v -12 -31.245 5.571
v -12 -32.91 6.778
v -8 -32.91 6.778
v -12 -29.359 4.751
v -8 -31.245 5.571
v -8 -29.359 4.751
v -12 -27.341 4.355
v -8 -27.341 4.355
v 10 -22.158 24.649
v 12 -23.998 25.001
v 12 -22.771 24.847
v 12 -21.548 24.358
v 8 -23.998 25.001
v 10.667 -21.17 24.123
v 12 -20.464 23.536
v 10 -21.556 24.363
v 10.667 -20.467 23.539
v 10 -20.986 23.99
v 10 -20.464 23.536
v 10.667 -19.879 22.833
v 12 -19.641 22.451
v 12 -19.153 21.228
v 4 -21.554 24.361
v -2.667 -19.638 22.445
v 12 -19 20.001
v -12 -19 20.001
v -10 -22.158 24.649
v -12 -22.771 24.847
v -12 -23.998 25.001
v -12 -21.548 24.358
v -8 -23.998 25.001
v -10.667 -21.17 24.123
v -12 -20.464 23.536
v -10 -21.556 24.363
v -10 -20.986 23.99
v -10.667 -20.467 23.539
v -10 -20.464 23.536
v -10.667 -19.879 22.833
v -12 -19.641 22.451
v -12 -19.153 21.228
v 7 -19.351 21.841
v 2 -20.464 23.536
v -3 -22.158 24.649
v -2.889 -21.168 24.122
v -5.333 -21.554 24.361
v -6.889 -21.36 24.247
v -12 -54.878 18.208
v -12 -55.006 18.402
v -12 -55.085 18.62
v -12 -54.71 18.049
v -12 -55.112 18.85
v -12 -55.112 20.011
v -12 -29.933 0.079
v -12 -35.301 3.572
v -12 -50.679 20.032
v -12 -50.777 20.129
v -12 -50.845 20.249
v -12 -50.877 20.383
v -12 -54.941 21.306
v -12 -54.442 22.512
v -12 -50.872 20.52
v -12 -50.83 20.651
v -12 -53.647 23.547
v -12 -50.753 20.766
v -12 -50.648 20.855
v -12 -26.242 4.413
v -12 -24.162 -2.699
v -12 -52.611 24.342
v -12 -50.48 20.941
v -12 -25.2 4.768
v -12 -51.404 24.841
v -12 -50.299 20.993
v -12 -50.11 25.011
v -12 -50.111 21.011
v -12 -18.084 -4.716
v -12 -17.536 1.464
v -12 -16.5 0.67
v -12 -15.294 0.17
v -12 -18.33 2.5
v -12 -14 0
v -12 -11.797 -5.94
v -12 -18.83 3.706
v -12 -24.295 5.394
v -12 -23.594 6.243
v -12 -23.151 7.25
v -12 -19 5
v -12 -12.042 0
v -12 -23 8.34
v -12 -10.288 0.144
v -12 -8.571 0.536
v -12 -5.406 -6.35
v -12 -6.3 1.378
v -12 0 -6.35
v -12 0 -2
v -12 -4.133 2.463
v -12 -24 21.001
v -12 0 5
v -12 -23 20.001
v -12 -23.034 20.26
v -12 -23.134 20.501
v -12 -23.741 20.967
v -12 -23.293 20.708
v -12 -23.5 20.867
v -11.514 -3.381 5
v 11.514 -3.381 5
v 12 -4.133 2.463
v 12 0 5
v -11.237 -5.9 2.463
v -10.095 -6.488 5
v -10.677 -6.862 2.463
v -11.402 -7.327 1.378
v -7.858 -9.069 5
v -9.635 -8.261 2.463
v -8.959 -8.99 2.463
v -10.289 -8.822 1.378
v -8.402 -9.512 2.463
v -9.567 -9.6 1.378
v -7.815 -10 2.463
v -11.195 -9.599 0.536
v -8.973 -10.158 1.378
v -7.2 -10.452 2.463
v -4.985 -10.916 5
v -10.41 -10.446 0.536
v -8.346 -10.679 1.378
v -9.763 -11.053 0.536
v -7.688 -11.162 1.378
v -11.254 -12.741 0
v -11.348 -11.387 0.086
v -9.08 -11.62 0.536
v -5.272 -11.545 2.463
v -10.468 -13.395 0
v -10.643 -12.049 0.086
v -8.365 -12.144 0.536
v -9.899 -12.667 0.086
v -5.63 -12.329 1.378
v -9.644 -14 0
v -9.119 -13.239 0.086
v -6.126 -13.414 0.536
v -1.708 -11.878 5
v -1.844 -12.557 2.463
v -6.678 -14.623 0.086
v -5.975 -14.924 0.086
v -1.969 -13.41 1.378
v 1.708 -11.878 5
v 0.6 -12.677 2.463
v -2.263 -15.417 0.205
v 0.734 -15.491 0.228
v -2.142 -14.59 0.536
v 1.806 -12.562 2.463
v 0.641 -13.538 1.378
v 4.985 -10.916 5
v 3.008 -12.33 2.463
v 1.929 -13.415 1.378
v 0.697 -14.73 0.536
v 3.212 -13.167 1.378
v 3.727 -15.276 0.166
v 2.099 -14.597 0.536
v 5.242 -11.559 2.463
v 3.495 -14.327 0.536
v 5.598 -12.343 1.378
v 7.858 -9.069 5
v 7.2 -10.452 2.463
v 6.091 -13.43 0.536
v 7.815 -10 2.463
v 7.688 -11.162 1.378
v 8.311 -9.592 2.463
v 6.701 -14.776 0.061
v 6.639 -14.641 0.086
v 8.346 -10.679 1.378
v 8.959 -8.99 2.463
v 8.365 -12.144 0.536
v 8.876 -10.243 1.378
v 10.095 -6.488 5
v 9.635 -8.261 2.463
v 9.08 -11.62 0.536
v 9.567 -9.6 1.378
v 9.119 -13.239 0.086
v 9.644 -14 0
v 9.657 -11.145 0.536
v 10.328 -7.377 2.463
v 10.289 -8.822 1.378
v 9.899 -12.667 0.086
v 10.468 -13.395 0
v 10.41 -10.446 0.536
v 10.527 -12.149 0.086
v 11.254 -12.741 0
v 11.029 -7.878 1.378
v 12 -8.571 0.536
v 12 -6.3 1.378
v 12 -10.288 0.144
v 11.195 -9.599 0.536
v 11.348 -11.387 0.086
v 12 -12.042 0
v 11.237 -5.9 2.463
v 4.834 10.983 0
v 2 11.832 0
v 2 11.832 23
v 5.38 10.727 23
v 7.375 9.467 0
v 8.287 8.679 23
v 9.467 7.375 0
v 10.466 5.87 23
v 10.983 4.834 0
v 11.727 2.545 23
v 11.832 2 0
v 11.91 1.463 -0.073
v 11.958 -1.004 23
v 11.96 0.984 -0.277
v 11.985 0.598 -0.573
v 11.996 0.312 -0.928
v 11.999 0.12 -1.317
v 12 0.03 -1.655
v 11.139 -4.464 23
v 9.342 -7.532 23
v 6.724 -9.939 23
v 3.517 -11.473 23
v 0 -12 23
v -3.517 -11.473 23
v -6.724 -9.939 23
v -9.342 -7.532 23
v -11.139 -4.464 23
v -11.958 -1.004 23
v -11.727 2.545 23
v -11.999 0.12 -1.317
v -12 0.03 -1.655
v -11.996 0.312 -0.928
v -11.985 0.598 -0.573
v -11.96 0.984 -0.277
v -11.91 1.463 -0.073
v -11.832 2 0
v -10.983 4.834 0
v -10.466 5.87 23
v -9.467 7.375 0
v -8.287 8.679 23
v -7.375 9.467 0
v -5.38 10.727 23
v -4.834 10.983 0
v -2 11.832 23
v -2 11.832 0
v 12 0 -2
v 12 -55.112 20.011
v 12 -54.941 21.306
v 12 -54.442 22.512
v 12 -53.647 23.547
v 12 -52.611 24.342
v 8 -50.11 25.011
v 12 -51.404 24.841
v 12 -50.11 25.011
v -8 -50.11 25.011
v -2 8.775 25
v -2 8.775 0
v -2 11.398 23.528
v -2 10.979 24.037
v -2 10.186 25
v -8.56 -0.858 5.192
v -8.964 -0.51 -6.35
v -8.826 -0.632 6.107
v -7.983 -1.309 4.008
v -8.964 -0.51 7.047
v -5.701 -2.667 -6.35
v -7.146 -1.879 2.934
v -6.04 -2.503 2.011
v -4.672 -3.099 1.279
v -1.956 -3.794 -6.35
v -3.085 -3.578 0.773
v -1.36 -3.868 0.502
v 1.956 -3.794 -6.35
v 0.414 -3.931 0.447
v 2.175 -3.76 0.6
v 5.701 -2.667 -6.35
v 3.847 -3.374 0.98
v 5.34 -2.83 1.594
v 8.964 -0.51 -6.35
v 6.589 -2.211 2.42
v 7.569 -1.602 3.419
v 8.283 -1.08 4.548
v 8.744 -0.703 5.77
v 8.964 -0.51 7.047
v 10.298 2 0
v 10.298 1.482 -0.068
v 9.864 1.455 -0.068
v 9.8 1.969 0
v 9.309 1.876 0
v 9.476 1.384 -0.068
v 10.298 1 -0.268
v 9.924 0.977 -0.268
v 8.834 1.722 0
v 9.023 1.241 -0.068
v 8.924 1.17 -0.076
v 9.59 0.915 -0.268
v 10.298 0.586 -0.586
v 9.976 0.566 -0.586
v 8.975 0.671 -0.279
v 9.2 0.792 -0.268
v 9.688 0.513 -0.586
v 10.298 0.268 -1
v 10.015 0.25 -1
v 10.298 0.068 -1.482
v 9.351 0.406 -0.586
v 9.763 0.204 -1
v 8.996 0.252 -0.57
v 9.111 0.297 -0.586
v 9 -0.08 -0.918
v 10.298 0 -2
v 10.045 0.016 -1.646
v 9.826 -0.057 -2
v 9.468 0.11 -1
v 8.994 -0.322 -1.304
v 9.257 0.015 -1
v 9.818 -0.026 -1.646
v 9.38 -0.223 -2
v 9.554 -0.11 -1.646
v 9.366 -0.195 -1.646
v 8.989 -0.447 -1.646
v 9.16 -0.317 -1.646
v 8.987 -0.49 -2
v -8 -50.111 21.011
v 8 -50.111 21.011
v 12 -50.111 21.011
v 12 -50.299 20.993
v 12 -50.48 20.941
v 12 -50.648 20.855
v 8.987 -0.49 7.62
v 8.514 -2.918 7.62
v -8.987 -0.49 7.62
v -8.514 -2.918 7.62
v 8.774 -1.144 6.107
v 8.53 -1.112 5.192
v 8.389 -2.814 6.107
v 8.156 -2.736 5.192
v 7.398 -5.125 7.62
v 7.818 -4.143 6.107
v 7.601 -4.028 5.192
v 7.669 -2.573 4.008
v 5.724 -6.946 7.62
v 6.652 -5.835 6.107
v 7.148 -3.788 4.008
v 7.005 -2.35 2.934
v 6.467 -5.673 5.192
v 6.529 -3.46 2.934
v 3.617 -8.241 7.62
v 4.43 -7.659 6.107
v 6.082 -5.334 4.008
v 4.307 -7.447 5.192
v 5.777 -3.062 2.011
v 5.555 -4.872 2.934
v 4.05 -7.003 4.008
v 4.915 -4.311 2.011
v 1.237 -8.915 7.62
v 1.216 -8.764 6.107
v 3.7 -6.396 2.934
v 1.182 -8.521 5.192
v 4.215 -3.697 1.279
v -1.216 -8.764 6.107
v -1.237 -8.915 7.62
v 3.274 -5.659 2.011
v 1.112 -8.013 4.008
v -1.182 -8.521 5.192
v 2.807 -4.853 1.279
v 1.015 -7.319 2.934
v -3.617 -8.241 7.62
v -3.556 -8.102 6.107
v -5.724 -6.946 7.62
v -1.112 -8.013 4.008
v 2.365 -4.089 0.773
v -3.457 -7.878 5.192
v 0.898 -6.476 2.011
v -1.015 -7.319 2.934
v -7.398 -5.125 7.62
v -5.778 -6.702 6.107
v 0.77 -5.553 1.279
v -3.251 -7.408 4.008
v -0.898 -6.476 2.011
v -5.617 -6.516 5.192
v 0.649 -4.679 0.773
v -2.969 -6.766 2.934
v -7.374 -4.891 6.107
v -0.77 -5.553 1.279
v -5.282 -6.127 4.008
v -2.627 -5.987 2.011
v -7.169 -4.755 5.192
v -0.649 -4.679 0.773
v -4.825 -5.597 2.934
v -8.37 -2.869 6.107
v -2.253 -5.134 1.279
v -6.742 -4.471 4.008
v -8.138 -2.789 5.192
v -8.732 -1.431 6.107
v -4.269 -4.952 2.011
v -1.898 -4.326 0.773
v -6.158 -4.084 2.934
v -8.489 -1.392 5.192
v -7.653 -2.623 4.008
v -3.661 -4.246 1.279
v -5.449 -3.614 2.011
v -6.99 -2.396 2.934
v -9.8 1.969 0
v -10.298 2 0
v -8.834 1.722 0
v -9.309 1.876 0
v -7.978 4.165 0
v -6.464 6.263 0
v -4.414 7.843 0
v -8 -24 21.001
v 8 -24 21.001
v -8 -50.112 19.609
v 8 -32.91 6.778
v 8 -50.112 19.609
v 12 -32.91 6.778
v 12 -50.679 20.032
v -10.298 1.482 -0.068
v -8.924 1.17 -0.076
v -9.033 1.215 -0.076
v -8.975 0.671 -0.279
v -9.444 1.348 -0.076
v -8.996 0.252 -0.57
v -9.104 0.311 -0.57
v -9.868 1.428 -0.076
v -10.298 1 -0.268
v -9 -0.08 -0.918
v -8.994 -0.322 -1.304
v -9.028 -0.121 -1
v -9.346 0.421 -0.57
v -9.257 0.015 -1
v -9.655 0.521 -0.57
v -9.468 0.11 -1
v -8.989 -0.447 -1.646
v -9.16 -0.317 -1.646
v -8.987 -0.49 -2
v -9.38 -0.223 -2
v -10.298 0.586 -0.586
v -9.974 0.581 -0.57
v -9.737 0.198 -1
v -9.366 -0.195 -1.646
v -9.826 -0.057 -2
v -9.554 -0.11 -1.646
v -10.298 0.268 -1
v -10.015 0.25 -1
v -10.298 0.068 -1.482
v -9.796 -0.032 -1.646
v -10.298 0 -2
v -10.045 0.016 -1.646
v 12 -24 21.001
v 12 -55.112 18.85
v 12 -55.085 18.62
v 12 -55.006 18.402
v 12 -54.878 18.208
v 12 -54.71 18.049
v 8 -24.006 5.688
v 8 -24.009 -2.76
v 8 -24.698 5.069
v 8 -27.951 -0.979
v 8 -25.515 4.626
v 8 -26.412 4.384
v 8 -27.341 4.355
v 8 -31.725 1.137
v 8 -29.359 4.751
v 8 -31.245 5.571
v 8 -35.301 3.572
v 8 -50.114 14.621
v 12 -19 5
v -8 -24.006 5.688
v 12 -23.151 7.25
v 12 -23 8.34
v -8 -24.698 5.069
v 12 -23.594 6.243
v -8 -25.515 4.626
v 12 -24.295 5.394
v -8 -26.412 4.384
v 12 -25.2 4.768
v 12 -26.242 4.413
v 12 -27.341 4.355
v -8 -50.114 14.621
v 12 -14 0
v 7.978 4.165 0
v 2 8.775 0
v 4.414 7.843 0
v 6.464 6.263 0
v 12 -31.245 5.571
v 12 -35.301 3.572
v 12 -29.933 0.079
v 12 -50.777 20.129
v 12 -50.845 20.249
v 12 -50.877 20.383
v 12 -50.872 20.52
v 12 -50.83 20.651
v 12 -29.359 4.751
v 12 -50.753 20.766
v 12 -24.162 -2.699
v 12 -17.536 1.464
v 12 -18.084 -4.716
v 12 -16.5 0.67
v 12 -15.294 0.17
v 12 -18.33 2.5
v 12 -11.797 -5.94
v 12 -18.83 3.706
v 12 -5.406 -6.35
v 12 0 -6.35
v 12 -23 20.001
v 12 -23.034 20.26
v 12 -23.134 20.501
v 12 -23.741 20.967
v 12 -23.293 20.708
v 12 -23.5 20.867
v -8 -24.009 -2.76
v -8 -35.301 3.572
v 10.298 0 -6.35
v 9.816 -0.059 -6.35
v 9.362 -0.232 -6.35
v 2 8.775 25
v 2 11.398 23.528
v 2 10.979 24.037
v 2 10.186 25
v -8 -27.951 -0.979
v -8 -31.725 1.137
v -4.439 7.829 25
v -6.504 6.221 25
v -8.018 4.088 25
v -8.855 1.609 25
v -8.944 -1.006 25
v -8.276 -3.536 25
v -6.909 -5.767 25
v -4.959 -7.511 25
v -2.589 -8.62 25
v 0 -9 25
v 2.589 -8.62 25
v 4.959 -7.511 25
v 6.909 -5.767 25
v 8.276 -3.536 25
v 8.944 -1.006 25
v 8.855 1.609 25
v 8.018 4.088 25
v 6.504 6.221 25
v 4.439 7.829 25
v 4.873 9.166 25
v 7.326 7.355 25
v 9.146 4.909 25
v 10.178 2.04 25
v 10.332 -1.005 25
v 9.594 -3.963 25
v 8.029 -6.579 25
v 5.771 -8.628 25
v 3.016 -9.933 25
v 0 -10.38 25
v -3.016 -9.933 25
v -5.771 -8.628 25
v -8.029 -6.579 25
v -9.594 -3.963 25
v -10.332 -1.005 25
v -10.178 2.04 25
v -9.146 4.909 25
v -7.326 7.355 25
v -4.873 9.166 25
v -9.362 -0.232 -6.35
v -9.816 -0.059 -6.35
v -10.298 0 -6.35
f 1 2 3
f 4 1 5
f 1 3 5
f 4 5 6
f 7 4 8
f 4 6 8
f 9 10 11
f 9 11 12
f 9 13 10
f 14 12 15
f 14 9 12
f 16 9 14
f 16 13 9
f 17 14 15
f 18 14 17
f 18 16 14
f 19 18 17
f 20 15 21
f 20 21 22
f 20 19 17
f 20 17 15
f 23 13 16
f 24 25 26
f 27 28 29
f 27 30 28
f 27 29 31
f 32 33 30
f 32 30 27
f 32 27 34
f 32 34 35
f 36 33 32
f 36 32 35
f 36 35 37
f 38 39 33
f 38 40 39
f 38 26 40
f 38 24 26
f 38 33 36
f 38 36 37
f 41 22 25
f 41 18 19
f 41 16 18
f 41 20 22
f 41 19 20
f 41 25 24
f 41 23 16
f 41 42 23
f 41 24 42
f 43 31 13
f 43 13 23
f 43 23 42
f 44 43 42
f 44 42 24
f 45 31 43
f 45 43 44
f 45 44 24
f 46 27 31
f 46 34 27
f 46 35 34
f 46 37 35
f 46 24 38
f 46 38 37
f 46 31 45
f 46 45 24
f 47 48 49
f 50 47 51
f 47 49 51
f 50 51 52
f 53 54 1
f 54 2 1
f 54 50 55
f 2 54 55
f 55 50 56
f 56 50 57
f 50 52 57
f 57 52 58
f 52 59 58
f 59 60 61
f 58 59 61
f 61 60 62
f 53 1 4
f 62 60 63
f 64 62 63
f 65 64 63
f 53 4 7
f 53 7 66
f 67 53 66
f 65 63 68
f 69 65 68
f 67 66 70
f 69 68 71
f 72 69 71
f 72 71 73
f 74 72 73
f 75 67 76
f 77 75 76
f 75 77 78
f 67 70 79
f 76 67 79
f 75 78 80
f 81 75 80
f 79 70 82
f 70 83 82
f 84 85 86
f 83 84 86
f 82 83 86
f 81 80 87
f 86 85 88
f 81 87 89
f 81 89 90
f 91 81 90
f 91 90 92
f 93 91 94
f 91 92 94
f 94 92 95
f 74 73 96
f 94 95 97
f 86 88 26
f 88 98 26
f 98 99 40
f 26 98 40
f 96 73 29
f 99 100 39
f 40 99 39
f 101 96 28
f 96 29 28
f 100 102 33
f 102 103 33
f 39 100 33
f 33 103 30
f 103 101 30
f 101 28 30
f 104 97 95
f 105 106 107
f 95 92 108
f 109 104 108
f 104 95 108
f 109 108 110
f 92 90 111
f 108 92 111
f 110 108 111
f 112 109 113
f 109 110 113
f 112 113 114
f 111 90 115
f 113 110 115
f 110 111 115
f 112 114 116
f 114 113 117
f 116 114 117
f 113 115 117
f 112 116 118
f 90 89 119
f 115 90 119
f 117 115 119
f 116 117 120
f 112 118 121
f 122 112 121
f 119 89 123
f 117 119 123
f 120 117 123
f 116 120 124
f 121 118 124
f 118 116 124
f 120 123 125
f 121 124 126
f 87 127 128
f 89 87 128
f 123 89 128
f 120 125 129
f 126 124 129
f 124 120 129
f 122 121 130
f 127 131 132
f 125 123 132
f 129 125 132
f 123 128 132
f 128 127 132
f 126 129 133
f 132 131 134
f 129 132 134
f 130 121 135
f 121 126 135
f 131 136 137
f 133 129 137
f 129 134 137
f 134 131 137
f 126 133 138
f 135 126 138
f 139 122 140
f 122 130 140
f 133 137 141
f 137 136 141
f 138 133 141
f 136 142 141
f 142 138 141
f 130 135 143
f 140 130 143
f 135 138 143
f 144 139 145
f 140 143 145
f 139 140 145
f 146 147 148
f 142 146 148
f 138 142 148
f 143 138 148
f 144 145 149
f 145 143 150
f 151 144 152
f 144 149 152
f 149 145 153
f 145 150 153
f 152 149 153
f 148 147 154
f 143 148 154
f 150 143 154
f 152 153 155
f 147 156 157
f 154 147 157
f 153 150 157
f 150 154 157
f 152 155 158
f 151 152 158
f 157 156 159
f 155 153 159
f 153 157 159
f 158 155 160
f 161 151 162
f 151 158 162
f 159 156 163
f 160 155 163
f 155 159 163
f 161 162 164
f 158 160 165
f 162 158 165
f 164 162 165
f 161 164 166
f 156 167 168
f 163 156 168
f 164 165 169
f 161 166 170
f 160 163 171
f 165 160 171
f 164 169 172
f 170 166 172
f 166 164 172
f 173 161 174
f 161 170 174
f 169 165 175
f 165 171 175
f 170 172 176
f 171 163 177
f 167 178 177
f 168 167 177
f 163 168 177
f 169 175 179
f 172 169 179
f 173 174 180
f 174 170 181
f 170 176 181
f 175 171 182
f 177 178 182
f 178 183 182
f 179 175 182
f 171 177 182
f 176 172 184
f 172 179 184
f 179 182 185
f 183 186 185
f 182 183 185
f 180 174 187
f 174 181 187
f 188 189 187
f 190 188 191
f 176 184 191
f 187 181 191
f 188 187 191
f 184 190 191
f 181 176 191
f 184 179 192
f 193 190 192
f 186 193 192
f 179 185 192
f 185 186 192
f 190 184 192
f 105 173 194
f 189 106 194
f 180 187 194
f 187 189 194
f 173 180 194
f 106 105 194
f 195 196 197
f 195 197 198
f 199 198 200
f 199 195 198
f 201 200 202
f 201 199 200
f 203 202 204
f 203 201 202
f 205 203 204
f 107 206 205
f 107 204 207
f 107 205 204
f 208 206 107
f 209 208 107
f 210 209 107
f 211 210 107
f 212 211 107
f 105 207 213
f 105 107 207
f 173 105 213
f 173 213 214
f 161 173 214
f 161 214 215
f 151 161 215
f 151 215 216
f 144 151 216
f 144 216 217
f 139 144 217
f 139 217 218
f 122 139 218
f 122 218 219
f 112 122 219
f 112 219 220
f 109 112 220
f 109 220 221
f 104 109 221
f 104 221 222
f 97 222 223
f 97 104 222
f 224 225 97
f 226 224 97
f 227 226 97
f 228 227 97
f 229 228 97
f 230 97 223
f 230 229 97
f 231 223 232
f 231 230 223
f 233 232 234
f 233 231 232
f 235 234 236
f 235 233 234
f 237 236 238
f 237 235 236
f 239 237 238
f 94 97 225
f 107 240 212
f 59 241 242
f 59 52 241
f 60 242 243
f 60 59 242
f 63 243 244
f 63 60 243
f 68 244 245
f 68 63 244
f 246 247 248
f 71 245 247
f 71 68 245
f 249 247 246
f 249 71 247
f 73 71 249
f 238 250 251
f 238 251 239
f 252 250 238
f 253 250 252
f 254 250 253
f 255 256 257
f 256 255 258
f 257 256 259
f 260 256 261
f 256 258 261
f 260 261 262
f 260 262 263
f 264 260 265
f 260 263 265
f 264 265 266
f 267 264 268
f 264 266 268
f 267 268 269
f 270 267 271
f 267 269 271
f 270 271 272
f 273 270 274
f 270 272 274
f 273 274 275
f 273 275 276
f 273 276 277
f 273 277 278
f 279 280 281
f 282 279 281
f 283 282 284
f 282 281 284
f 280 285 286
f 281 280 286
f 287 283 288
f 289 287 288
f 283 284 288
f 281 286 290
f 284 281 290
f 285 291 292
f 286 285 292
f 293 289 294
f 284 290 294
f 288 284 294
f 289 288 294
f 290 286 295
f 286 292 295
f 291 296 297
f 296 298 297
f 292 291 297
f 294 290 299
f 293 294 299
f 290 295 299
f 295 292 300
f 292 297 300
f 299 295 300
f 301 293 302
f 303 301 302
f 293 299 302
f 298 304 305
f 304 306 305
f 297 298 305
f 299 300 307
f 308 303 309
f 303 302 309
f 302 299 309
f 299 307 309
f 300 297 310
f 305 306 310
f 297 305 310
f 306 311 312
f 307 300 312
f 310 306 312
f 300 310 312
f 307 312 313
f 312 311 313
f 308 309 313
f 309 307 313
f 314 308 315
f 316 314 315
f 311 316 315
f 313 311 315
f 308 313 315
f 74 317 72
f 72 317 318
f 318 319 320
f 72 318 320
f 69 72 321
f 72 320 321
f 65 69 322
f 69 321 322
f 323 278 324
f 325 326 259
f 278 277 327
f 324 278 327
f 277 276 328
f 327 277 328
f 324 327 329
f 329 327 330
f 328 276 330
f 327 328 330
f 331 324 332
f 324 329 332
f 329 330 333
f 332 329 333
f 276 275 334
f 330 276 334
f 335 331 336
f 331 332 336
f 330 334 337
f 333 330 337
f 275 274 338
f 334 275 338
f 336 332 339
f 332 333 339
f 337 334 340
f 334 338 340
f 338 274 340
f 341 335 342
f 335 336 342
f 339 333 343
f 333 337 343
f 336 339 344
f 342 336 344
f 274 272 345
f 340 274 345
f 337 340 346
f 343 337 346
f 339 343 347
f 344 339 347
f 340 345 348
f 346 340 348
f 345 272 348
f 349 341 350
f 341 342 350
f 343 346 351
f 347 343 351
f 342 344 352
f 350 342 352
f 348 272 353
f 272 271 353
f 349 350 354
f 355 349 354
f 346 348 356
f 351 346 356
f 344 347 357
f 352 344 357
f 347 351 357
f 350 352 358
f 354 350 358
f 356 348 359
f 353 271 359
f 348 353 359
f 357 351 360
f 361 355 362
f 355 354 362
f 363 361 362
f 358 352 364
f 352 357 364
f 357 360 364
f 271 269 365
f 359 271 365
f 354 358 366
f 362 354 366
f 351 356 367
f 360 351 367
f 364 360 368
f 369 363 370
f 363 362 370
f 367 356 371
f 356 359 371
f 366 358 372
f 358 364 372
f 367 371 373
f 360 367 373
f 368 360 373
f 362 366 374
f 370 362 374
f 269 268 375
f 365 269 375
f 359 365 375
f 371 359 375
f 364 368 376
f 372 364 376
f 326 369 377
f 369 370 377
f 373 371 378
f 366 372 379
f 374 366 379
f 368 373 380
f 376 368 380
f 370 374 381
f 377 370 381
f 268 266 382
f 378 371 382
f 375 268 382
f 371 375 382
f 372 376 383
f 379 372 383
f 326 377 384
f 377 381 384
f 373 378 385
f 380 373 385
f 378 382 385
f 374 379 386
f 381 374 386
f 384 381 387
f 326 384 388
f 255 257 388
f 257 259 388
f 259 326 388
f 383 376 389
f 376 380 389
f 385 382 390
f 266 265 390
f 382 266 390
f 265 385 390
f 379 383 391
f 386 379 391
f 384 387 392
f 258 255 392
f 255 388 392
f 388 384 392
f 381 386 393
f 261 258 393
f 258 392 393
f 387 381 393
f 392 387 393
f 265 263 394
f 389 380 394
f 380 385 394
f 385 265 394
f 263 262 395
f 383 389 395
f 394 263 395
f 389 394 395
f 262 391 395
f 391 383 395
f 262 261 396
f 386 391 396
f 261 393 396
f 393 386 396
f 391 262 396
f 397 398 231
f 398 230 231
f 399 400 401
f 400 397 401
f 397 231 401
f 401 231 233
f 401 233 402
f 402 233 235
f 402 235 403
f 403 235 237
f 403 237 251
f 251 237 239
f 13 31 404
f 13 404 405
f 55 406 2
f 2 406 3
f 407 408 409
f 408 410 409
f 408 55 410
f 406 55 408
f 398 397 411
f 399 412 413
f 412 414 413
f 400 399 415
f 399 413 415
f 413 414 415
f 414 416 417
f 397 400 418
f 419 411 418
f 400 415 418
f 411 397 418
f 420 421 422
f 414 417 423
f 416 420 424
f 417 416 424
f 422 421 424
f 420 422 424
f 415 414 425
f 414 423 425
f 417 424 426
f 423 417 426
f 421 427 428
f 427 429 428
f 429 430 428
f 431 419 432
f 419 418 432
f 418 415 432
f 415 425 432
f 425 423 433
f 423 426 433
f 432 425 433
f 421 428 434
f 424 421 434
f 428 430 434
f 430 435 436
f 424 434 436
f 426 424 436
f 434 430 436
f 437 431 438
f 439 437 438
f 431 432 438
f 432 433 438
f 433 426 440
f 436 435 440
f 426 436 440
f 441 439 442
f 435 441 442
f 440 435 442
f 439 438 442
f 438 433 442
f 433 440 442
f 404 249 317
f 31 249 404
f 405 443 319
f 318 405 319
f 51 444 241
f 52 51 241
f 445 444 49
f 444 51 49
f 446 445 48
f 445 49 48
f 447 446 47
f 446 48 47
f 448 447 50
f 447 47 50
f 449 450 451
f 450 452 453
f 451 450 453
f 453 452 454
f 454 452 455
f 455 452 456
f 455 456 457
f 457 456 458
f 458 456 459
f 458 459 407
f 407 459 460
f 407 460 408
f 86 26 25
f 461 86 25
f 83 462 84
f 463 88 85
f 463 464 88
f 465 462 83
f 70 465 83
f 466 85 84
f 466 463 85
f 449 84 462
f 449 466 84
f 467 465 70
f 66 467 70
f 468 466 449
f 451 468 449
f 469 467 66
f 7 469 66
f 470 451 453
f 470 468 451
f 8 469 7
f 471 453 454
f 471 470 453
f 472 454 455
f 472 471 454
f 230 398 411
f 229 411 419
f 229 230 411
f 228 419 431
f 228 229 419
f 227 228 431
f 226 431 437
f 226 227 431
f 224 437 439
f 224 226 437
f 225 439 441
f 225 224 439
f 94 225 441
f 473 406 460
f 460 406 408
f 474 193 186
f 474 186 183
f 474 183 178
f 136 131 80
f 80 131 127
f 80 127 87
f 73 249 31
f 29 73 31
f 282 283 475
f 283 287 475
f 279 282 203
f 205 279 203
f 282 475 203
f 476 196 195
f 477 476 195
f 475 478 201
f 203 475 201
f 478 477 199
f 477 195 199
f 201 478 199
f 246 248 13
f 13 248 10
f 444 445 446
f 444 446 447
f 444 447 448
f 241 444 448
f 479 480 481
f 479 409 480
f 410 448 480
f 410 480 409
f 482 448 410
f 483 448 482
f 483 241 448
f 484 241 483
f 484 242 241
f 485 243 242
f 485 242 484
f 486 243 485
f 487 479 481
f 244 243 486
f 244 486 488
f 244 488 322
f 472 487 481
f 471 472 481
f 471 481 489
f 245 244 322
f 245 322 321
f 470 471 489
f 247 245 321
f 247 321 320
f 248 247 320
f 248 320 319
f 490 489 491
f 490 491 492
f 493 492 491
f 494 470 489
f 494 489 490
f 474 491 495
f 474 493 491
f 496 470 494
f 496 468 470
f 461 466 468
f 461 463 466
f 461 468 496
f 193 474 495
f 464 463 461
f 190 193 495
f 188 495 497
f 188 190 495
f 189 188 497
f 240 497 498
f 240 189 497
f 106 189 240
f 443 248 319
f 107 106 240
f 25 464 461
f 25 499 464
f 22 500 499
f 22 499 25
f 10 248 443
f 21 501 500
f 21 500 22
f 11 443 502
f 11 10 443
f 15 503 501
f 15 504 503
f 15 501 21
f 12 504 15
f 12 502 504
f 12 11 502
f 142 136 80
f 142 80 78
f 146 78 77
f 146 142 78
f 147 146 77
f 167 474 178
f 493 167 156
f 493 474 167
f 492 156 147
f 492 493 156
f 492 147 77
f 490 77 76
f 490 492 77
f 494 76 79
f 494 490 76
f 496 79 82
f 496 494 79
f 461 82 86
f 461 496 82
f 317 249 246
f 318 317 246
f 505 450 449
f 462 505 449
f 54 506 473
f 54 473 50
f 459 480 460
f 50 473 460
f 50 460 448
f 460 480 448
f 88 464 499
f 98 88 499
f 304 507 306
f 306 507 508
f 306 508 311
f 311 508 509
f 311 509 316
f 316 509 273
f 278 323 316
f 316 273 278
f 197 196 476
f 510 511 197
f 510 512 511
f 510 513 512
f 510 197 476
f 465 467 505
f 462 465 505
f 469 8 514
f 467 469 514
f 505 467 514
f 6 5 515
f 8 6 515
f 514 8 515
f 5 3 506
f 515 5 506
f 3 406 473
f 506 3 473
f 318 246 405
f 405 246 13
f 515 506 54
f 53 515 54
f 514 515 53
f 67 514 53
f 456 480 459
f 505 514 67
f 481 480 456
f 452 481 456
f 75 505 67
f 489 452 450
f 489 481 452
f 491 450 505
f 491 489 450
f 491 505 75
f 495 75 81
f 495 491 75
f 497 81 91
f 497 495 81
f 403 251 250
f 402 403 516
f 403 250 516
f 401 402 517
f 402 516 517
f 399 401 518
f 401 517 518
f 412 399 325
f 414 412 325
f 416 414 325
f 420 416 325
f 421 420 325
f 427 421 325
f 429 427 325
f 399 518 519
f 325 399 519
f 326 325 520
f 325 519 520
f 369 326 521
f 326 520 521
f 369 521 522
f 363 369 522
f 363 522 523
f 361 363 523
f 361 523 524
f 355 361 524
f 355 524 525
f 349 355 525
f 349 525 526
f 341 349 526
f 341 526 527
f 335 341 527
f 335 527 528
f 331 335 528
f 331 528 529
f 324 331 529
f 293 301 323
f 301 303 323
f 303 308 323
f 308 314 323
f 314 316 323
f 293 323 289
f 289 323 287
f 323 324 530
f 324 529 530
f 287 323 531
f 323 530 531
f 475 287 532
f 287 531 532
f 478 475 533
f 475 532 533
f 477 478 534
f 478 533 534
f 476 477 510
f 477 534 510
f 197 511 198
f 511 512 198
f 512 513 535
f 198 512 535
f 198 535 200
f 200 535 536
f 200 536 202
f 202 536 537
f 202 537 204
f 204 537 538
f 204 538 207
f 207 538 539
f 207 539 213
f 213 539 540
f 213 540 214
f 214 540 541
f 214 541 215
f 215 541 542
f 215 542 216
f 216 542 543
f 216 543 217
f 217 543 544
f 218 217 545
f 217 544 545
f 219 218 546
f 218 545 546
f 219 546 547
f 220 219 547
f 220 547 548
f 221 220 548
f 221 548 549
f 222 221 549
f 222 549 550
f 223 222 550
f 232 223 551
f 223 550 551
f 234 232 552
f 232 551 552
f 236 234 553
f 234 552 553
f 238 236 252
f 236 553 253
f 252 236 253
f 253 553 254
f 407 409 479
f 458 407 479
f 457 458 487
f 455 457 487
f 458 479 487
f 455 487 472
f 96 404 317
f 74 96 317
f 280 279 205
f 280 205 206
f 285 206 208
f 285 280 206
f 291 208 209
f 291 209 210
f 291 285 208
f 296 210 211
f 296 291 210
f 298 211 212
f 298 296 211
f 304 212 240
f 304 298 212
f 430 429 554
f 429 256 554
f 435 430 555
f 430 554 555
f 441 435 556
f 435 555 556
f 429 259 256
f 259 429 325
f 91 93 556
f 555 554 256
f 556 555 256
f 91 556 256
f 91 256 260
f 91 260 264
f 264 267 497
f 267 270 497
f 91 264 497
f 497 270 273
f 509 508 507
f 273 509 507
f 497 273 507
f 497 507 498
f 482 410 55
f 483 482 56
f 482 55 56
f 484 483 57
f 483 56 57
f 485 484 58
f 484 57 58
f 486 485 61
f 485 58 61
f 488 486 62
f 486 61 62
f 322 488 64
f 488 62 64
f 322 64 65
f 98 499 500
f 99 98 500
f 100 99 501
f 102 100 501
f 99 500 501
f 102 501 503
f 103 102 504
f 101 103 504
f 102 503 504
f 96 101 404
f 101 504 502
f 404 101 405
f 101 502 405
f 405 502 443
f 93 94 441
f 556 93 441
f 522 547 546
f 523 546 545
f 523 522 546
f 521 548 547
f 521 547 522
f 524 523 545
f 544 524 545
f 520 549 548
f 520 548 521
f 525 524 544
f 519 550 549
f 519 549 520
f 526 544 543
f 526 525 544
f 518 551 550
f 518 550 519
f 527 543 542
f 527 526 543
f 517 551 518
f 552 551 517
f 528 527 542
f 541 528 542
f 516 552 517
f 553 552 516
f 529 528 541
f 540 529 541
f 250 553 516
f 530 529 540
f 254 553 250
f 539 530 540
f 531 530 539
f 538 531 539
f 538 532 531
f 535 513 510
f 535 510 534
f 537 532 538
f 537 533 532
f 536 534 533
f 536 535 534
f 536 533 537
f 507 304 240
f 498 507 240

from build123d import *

# Parameters (mm, degrees)
SKETCH1_R           = 12
BOSS_EXTRUDE1_DEPTH = 25
CUT_EXTRUDE1_DEPTH  = 25
BOSS_EXTRUDE2_DEPTH = 6.35
FILLET1_R           = 7.62
CHAMFER1_SIZE       = 2
CHAMFER1_SIZE2      = 1.6195680663900194
BOSS_EXTRUDE3_DEPTH = 3
BOSS_EXTRUDE4_DEPTH = 24
FILLET3_R           = 50
FILLET7_R           = 5
FILLET8_R           = 5
FILLET9_R           = 5
CUT_EXTRUDE2_DEPTH  = 24
FILLET10_R          = 1
FILLET12_R          = 2
FILLET13_R          = 2
CUT_EXTRUDE3_REACH  = 66.534
SKETCH9_W           = 16.00000000000001
SKETCH9_H           = 26.111776117406702
FILLET14_R          = 0.5
FILLET15_R          = 4


with BuildPart() as part:
    # Sketch1 → Boss-Extrude1 (new body)
    with BuildSketch(Plane.XY):
        Circle(SKETCH1_R)
    extrude(amount=BOSS_EXTRUDE1_DEPTH)

    # Sketch2 → Cut-Extrude1 (cut)
    with BuildSketch(Plane.XY.offset(25)):
        with BuildLine():
            Line((-2, 12), (2, 12))
            Line((2, 12), (2, 8.77496438739212))
            ThreePointArc((2, 8.77496438739212), (-1.65e-15, -8.999999999999998), (-2, 8.77496438739212))
            Line((-2, 8.77496438739212), (-2, 12))
        make_face()
    extrude(amount=-CUT_EXTRUDE1_DEPTH, mode=Mode.SUBTRACT)

    # Sketch3 → Boss-Extrude2 (add)
    with BuildSketch(Plane(origin=(0, 0, 0), x_dir=(-1, 0, 0), z_dir=(0, 0, -1))):
        with BuildLine():
            Line((-9.50278743316929, 0), (-12.000000000000002, 0))
            Line((-12.000000000000002, 0), (-12.000000000000004, -19))
            Line((-12.000000000000004, -19), (12.000000000000004, -19))
            Line((12.000000000000004, -19), (12.000000000000002, 0))
            Line((12.000000000000002, 0), (9.50278743316929, 0))
            ThreePointArc((9.50278743316929, 0), (8.2e-16, -3.9369999999999994), (-9.50278743316929, 0))
        make_face()
    extrude(amount=BOSS_EXTRUDE2_DEPTH)

    # Fillet1
    # the kernel refuses this fillet: 7.62 mm, written as the material it adds along each edge
    with BuildSketch(Plane(origin=(-8.3e-16, 4.2e-16, 0), x_dir=(0.0031415874858799547, 0.9999950652018581, 0), z_dir=(-0.9999950652018581, 0.0031415874858799547, 0))) as fillet1_piece_1_section:
        with BuildLine():
            CenterArc((8.999999999999998 - FILLET1_R, -FILLET1_R), FILLET1_R, 0, 89.99999999999999)
            Line((8.999999999999998 - FILLET1_R, 2.66e-15), (8.999999999999998, 0))
            Line((8.999999999999998, 0), (8.999999999999996, -FILLET1_R))
        make_face()
    fillet1_piece_1 = revolve(axis=Axis((-8.3e-16, 4.2e-16, 0), (0, 0, -1)), revolution_arc=359.64, mode=Mode.PRIVATE)
    fillet1_piece_1 = fillet1_piece_1 - Plane(origin=(0, 9.500000000000028, 1.752978238820399), x_dir=(-0.7072104958822112, -0.7070030512763273, 0), z_dir=(0, 0, 1)) * Cylinder(13.437000000000028, 36, mode=Mode.PRIVATE)
    add(fillet1_piece_1)

    # Chamfer1
    chamfer1_edges = [part.edges().sort_by_distance(p)[0] for p in [
        (-1.0525e-13, -12, 25),
    ]]
    chamfer1_side = [part.faces().sort_by_distance(p)[0] for p in [
        (-2.2e-15, -12, 12.5),
    ]]
    chamfer(chamfer1_edges, length=CHAMFER1_SIZE, length2=CHAMFER1_SIZE2, reference=chamfer1_side[0])

    # Sketch6 → Boss-Extrude3 (add)
    with BuildSketch(Plane.XZ.offset(19)):
        Polygon((-12.000000000000007, 25), (-12.000000000000005, -6.35), (12.000000000000005, -6.35), (12.000000000000004, 25.00000000000001), align=None)
    extrude(amount=BOSS_EXTRUDE3_DEPTH)

    # Sketch7 → Boss-Extrude4 (add)
    with BuildSketch(Plane(origin=(12.000000000000002, 1.1e-15, 0), x_dir=(0, 0, -1), z_dir=(1, 1.9e-16, 0))):
        Polygon((-25.00000000000001, -22.000000000000004), (6.35, -22.000000000000004), (-18.348646063087493, -55.11177405445072), (-25.013162071560505, -55.11177405445072), align=None)
    extrude(amount=-BOSS_EXTRUDE4_DEPTH)

    # Fillet3
    fillet3_edges = [part.edges().sort_by_distance(p)[0] for p in [
        (0, -22, -6.35),
    ]]
    fillet(fillet3_edges, radius=FILLET3_R)

    # Fillet7
    # the kernel refuses this fillet: 5 mm, written as the material it adds along each edge
    with BuildSketch(Plane(origin=(0, 0, 0), x_dir=(-1, 6e-17, 0), z_dir=(6e-17, 1, 0))) as fillet7_piece_1_section:
        with BuildLine():
            CenterArc((12.000000000000002 + FILLET7_R, FILLET7_R), FILLET7_R, 180, 90)
            Line((12, FILLET7_R), (12.000000000000002, 0))
            Line((12.000000000000002, 0), (12.000000000000002 + FILLET7_R, 0))
        make_face()
    fillet7_piece_1 = revolve(axis=Axis((0, 0, 0), (0, 0, 1)), revolution_arc=179.99999999999997, mode=Mode.PRIVATE)
    fillet7_piece_1 = split(fillet7_piece_1, bisect_by=Plane(origin=(12.000000000000004, -12.055106327045037, 2.4999999999999996), z_dir=(-1, -9e-17, 0)), keep=Keep.TOP, mode=Mode.PRIVATE)
    fillet7_piece_1 = split(fillet7_piece_1, bisect_by=Plane(origin=(-12.000000000000004, -12.055106327045038, 2.4999999999999996), z_dir=(1, -9e-17, 0)), keep=Keep.TOP, mode=Mode.PRIVATE)
    add(fillet7_piece_1)
    with BuildSketch(Plane(origin=(12.000000000000004, -19, 0), x_dir=(0, 1, 0), z_dir=(-1, 0, 0))) as fillet7_piece_2:
        with BuildLine():
            CenterArc((FILLET7_R, -FILLET7_R), FILLET7_R, 90, 90)
            Line((0, -FILLET7_R), (0, 0))
            Line((0, 0), (FILLET7_R, 0))
        make_face()
    extrude(amount=24.000000000000007)

    # Fillet8
    fillet8_edges = [part.edges().sort_by_distance(p)[0] for p in [
        (1.243e-14, -55.11177405445072, 25.013162071560505),
    ]]
    fillet(fillet8_edges, radius=FILLET8_R)

    # Fillet9
    fillet9_edges = [part.edges().sort_by_distance(p)[0] for p in [
        (-1.78e-15, -19, 25.000000000000007),
    ]]
    fillet(fillet9_edges, radius=FILLET9_R)

    # Sketch8 → Cut-Extrude2 (cut)
    with BuildSketch(Plane(origin=(12.000000000000002, 1.1e-15, 0), x_dir=(0, 0, -1), z_dir=(1, 1.9e-16, 0))):
        with BuildLine():
            Line((-4.999999999999998, -23), (-20.000794613515104, -23.000000000000004))
            ThreePointArc((-20.000794613515104, -23.000000000000004), (-20.70776084176148, -23.292752693805703), (-21.000794534510295, -23.999602495761817))
            Line((-21.000794534510295, -23.999602495761817), (-21.011174076183625, -50.11137655021254))
            ThreePointArc((-21.011174076183625, -50.11137655021254), (-20.819933843558175, -50.699913295165096), (-20.318980441541633, -51.06322310199948))
            Line((-20.318980441541633, -51.06322310199948), (-6.777868461008763, -32.90958669617576))
            ThreePointArc((-6.777868461008763, -32.90958669617576), (-4.469648137926145, -28.20942596380706), (-4.999999999999998, -23))
        make_face()
    extrude(amount=-CUT_EXTRUDE2_DEPTH, mode=Mode.SUBTRACT)

    # Fillet10
    fillet10_edges = [part.edges().sort_by_distance(p)[0] for p in [
        (1.243e-14, -55.11177405445072, 18.348646063087493),
    ]]
    fillet(fillet10_edges, radius=FILLET10_R)

    # Fillet12
    fillet12_edges = [part.edges().sort_by_distance(p)[0] for p in [
        (-9.502787433169292, -8.9e-16, -3.175),
        (9.502787433169292, -8.9e-16, -3.175),
    ]]
    fillet(fillet12_edges, radius=FILLET12_R)

    # Fillet13
    # the kernel refuses this fillet: 2 mm, written as the material it adds along each edge
    with BuildSketch(Plane(origin=(10.298105116962052, 0, 0), x_dir=(0, 0, -1), z_dir=(1, 0, 0))) as fillet13_piece_1_section:
        with BuildLine():
            CenterArc((FILLET13_R, FILLET13_R), FILLET13_R, 180, 90)
            Line((-2.2e-16, FILLET13_R), (0, 0))
            Line((0, 0), (FILLET13_R, 0))
        make_face()
    fillet13_piece_1 = extrude(amount=6.701894883037948, mode=Mode.PRIVATE)
    fillet13_piece_1 = fillet13_piece_1 & Plane(origin=(0, 0, -0.44903446636731825), x_dir=(1, 0, 0), z_dir=(0, 0, -1)) * Cylinder(12, 22, mode=Mode.PRIVATE)
    add(fillet13_piece_1)
    with BuildSketch(Plane(origin=(-10.298105116962049, -2, 0), x_dir=(-0.07369380939887726, -0.9972809145152042, 0), z_dir=(-0.9972809145152042, 0.07369380939887726, 0))) as fillet13_piece_2_section:
        with BuildLine():
            CenterArc((2.0000000000000004 + FILLET13_R, -FILLET13_R), FILLET13_R, 89.99999999999997, 90)
            Line((2.0000000000000004 + FILLET13_R, 2.2e-16), (2.0000000000000004, 0))
            Line((2.0000000000000004, 0), (2, -FILLET13_R))
        make_face()
    fillet13_piece_2 = revolve(axis=Axis((-10.298105116962049, -2, 0), (0, 0, 1)), revolution_arc=184.22617539365706, mode=Mode.PRIVATE)
    fillet13_piece_2 = fillet13_piece_2 - Plane(origin=(-8.3e-16, 4.2e-16, -0.6407272575669332), x_dir=(0.22222222222222238, 0.9749960430435691, 0), z_dir=(0, 0, 1)) * Cylinder(8.999999999999998, 17, mode=Mode.PRIVATE)
    add(fillet13_piece_2)
    with BuildSketch(Plane(origin=(10.298105116962052, -2, 0), x_dir=(0, 1, 0), z_dir=(1, 0, 0))) as fillet13_piece_3_section:
        with BuildLine():
            CenterArc((2 + FILLET13_R, -FILLET13_R), FILLET13_R, 90, 90)
            Line((2 + FILLET13_R, 2.2e-16), (2, 0))
            Line((2, 0), (2, -FILLET13_R))
        make_face()
    fillet13_piece_3 = revolve(axis=Axis((10.298105116962052, -2, 0), (0, 0, 1)), revolution_arc=184.22617539365754, mode=Mode.PRIVATE)
    fillet13_piece_3 = fillet13_piece_3 - Plane(origin=(-8.3e-16, 4.2e-16, -0.8153326958488982), x_dir=(0.22222222222222238, 0.9749960430435691, 0), z_dir=(0, 0, 1)) * Cylinder(8.999999999999998, 16, mode=Mode.PRIVATE)
    add(fillet13_piece_3)
    with BuildSketch(Plane(origin=(-17, 0, 0), x_dir=(0, 0, -1), z_dir=(1, 0, 0))) as fillet13_piece_4_section:
        with BuildLine():
            CenterArc((FILLET13_R, FILLET13_R), FILLET13_R, 180, 90)
            Line((-2.2e-16, FILLET13_R), (0, 0))
            Line((0, 0), (FILLET13_R, 0))
        make_face()
    fillet13_piece_4 = extrude(amount=6.7018948830379514, mode=Mode.PRIVATE)
    fillet13_piece_4 = fillet13_piece_4 & Plane(origin=(0, 0, -0.4490342356486683), x_dir=(1, 0, 0), z_dir=(0, 0, -1)) * Cylinder(12, 22, mode=Mode.PRIVATE)
    add(fillet13_piece_4)

    # Cut-Extrude3: up to this plane
    cut_extrude3_end = Plane(origin=(-57.60742830022284, -22.000000000000018, -6.35), z_dir=(0, -0.5979035190056836, -0.8015680769345921))
    # Sketch9 → Cut-Extrude3 (cut, up to the surface)
    with BuildSketch(Plane(origin=(0, 0.00993412895799998, 24.991250957210262), x_dir=(1, 0, 0), z_dir=(0, 0.0003975042381898005, 0.9999999209951873)), mode=Mode.PRIVATE) as cut_extrude3_sk1:
        with Locations((0, -37.06383656321388)):
            Rectangle(SKETCH9_W, SKETCH9_H)
    cut_extrude3_tool1 = split(extrude(cut_extrude3_sk1.sketch, amount=-CUT_EXTRUDE3_REACH, mode=Mode.PRIVATE), bisect_by=cut_extrude3_end, keep=Keep.BOTH, mode=Mode.PRIVATE)
    add(cut_extrude3_tool1.solids().sort_by_distance((0, -37.0539, 25.005984))[0], mode=Mode.SUBTRACT)

    # Fillet14
    fillet14_edges = [part.edges().sort_by_distance(p)[0] for p in [
        (1.243e-14, -51.06322310199948, 20.318980441541633),
    ]]
    fillet(fillet14_edges, radius=FILLET14_R)

    # Fillet15
    # the kernel refuses this fillet: 4 mm, written as the material it adds along each edge
    with BuildSketch(Plane(origin=(12.000000000000007, -23, 4.999999999999999), x_dir=(0, -0.9891358109581738, -0.14700458319425255), z_dir=(-1, -1.9e-16, 0))) as fillet15_piece_1_section:
        with BuildLine():
            CenterArc((3.4655066348003034, 3.8920098406036834), FILLET15_R, 188.453377446245, 94.89048853854467)
            Line((-0.49103660903239127, 3.30399150782667), (0, 0))
            ThreePointArc((0, 0), (2.194342799690448, -0.2566863390527839), (4.388685599380896, -1e-17))
        make_face()
    fillet15_piece_1 = extrude(amount=24, mode=Mode.PRIVATE)
    fillet15_piece_1 = split(fillet15_piece_1, bisect_by=Plane(origin=(9.999999999999988, -24.006080855539047, 4.703209142937297), z_dir=(0, -0.9999999209951872, 0.0003975042381898005)), keep=Keep.TOP, mode=Mode.PRIVATE)
    fillet15_piece_1 = split(fillet15_piece_1, bisect_by=Plane(origin=(8.000000000000005, -24.97983402678631, 4.7035962139803935), z_dir=(1, 0, 0)), keep=Keep.TOP, mode=Mode.PRIVATE)
    add(fillet15_piece_1)
    with BuildSketch(Plane(origin=(12.000000000000007, -23, 4.999999999999999), x_dir=(0, -0.9891358109581738, -0.14700458319425255), z_dir=(-1, -1.9e-16, 0))) as fillet15_piece_2_section:
        with BuildLine():
            CenterArc((3.4655066348003034, 3.8920098406036834), FILLET15_R, 188.453377446245, 94.89048853854467)
            Line((-0.49103660903239127, 3.30399150782667), (0, 0))
            ThreePointArc((0, 0), (2.194342799690448, -0.2566863390527839), (4.388685599380896, -1e-17))
        make_face()
    fillet15_piece_2 = extrude(amount=24, mode=Mode.PRIVATE)
    fillet15_piece_2 = split(fillet15_piece_2, bisect_by=Plane(origin=(10.000000000000005, -24.005623928158137, 5.8526996411826), z_dir=(0, 0.9999999209951872, -0.0003975042381898005)), keep=Keep.TOP, mode=Mode.PRIVATE)
    fillet15_piece_2 = split(fillet15_piece_2, bisect_by=Plane(origin=(8.000000000000005, -23.360559138010366, 5.852443225174344), z_dir=(1, 0, 0)), keep=Keep.TOP, mode=Mode.PRIVATE)
    add(fillet15_piece_2)
    with BuildSketch(Plane(origin=(12.000000000000007, -23, 4.999999999999999), x_dir=(0, -0.9891358109581738, -0.14700458319425255), z_dir=(-1, -1.9e-16, 0))) as fillet15_piece_3_section:
        with BuildLine():
            CenterArc((3.4655066348003034, 3.8920098406036834), FILLET15_R, 188.453377446245, 94.89048853854467)
            Line((-0.49103660903239127, 3.30399150782667), (0, 0))
            ThreePointArc((0, 0), (2.194342799690448, -0.2566863390527839), (4.388685599380896, -1e-17))
        make_face()
    fillet15_piece_3 = extrude(amount=24, mode=Mode.PRIVATE)
    fillet15_piece_3 = split(fillet15_piece_3, bisect_by=Plane(origin=(-8.000000000000005, -23.360559138010377, 5.852443225174344), z_dir=(1, 0, 0)), keep=Keep.TOP, mode=Mode.PRIVATE)
    fillet15_piece_3 = split(fillet15_piece_3, bisect_by=Plane(origin=(-2.309e-14, -24.005623928158137, 5.8526996411826), z_dir=(0, 0.9999999209951872, -0.0003975042381898005)), keep=Keep.TOP, mode=Mode.PRIVATE)
    fillet15_piece_3 = split(fillet15_piece_3, bisect_by=Plane(origin=(8.000000000000005, -23.36055913801037, 5.852443225174344), z_dir=(-1, 0, 0)), keep=Keep.TOP, mode=Mode.PRIVATE)
    add(fillet15_piece_3)
    with BuildSketch(Plane(origin=(12.000000000000007, -23, 4.999999999999999), x_dir=(0, -0.9891358109581738, -0.14700458319425255), z_dir=(-1, -1.9e-16, 0))) as fillet15_piece_4_section:
        with BuildLine():
            CenterArc((3.4655066348003034, 3.8920098406036834), FILLET15_R, 188.453377446245, 94.89048853854467)
            Line((-0.49103660903239127, 3.30399150782667), (0, 0))
            ThreePointArc((0, 0), (2.194342799690448, -0.2566863390527839), (4.388685599380896, -1e-17))
        make_face()
    fillet15_piece_4 = extrude(amount=24, mode=Mode.PRIVATE)
    fillet15_piece_4 = split(fillet15_piece_4, bisect_by=Plane(origin=(-8.000000000000005, -24.979834026786307, 4.7035962139803935), z_dir=(-1, 0, 0)), keep=Keep.TOP, mode=Mode.PRIVATE)
    fillet15_piece_4 = split(fillet15_piece_4, bisect_by=Plane(origin=(-10.000000000000005, -24.006080855539047, 4.703209142937297), z_dir=(0, -0.9999999209951872, 0.0003975042381898005)), keep=Keep.TOP, mode=Mode.PRIVATE)
    add(fillet15_piece_4)
    with BuildSketch(Plane(origin=(12.000000000000007, -23, 4.999999999999999), x_dir=(0, -0.9891358109581738, -0.14700458319425255), z_dir=(-1, -1.9e-16, 0))) as fillet15_piece_5_section:
        with BuildLine():
            CenterArc((3.4655066348003034, 3.8920098406036834), FILLET15_R, 188.453377446245, 94.89048853854467)
            Line((-0.49103660903239127, 3.30399150782667), (0, 0))
            ThreePointArc((0, 0), (2.194342799690448, -0.2566863390527839), (4.388685599380896, -1e-17))
        make_face()
    fillet15_piece_5 = extrude(amount=24, mode=Mode.PRIVATE)
    fillet15_piece_5 = split(fillet15_piece_5, bisect_by=Plane(origin=(-8.000000000000005, -23.36055913801038, 5.852443225174344), z_dir=(-1, 0, 0)), keep=Keep.TOP, mode=Mode.PRIVATE)
    fillet15_piece_5 = split(fillet15_piece_5, bisect_by=Plane(origin=(-10.000000000000002, -24.005623928158137, 5.8526996411826), z_dir=(0, 0.9999999209951872, -0.0003975042381898005)), keep=Keep.TOP, mode=Mode.PRIVATE)
    add(fillet15_piece_5)


solid = part.part
